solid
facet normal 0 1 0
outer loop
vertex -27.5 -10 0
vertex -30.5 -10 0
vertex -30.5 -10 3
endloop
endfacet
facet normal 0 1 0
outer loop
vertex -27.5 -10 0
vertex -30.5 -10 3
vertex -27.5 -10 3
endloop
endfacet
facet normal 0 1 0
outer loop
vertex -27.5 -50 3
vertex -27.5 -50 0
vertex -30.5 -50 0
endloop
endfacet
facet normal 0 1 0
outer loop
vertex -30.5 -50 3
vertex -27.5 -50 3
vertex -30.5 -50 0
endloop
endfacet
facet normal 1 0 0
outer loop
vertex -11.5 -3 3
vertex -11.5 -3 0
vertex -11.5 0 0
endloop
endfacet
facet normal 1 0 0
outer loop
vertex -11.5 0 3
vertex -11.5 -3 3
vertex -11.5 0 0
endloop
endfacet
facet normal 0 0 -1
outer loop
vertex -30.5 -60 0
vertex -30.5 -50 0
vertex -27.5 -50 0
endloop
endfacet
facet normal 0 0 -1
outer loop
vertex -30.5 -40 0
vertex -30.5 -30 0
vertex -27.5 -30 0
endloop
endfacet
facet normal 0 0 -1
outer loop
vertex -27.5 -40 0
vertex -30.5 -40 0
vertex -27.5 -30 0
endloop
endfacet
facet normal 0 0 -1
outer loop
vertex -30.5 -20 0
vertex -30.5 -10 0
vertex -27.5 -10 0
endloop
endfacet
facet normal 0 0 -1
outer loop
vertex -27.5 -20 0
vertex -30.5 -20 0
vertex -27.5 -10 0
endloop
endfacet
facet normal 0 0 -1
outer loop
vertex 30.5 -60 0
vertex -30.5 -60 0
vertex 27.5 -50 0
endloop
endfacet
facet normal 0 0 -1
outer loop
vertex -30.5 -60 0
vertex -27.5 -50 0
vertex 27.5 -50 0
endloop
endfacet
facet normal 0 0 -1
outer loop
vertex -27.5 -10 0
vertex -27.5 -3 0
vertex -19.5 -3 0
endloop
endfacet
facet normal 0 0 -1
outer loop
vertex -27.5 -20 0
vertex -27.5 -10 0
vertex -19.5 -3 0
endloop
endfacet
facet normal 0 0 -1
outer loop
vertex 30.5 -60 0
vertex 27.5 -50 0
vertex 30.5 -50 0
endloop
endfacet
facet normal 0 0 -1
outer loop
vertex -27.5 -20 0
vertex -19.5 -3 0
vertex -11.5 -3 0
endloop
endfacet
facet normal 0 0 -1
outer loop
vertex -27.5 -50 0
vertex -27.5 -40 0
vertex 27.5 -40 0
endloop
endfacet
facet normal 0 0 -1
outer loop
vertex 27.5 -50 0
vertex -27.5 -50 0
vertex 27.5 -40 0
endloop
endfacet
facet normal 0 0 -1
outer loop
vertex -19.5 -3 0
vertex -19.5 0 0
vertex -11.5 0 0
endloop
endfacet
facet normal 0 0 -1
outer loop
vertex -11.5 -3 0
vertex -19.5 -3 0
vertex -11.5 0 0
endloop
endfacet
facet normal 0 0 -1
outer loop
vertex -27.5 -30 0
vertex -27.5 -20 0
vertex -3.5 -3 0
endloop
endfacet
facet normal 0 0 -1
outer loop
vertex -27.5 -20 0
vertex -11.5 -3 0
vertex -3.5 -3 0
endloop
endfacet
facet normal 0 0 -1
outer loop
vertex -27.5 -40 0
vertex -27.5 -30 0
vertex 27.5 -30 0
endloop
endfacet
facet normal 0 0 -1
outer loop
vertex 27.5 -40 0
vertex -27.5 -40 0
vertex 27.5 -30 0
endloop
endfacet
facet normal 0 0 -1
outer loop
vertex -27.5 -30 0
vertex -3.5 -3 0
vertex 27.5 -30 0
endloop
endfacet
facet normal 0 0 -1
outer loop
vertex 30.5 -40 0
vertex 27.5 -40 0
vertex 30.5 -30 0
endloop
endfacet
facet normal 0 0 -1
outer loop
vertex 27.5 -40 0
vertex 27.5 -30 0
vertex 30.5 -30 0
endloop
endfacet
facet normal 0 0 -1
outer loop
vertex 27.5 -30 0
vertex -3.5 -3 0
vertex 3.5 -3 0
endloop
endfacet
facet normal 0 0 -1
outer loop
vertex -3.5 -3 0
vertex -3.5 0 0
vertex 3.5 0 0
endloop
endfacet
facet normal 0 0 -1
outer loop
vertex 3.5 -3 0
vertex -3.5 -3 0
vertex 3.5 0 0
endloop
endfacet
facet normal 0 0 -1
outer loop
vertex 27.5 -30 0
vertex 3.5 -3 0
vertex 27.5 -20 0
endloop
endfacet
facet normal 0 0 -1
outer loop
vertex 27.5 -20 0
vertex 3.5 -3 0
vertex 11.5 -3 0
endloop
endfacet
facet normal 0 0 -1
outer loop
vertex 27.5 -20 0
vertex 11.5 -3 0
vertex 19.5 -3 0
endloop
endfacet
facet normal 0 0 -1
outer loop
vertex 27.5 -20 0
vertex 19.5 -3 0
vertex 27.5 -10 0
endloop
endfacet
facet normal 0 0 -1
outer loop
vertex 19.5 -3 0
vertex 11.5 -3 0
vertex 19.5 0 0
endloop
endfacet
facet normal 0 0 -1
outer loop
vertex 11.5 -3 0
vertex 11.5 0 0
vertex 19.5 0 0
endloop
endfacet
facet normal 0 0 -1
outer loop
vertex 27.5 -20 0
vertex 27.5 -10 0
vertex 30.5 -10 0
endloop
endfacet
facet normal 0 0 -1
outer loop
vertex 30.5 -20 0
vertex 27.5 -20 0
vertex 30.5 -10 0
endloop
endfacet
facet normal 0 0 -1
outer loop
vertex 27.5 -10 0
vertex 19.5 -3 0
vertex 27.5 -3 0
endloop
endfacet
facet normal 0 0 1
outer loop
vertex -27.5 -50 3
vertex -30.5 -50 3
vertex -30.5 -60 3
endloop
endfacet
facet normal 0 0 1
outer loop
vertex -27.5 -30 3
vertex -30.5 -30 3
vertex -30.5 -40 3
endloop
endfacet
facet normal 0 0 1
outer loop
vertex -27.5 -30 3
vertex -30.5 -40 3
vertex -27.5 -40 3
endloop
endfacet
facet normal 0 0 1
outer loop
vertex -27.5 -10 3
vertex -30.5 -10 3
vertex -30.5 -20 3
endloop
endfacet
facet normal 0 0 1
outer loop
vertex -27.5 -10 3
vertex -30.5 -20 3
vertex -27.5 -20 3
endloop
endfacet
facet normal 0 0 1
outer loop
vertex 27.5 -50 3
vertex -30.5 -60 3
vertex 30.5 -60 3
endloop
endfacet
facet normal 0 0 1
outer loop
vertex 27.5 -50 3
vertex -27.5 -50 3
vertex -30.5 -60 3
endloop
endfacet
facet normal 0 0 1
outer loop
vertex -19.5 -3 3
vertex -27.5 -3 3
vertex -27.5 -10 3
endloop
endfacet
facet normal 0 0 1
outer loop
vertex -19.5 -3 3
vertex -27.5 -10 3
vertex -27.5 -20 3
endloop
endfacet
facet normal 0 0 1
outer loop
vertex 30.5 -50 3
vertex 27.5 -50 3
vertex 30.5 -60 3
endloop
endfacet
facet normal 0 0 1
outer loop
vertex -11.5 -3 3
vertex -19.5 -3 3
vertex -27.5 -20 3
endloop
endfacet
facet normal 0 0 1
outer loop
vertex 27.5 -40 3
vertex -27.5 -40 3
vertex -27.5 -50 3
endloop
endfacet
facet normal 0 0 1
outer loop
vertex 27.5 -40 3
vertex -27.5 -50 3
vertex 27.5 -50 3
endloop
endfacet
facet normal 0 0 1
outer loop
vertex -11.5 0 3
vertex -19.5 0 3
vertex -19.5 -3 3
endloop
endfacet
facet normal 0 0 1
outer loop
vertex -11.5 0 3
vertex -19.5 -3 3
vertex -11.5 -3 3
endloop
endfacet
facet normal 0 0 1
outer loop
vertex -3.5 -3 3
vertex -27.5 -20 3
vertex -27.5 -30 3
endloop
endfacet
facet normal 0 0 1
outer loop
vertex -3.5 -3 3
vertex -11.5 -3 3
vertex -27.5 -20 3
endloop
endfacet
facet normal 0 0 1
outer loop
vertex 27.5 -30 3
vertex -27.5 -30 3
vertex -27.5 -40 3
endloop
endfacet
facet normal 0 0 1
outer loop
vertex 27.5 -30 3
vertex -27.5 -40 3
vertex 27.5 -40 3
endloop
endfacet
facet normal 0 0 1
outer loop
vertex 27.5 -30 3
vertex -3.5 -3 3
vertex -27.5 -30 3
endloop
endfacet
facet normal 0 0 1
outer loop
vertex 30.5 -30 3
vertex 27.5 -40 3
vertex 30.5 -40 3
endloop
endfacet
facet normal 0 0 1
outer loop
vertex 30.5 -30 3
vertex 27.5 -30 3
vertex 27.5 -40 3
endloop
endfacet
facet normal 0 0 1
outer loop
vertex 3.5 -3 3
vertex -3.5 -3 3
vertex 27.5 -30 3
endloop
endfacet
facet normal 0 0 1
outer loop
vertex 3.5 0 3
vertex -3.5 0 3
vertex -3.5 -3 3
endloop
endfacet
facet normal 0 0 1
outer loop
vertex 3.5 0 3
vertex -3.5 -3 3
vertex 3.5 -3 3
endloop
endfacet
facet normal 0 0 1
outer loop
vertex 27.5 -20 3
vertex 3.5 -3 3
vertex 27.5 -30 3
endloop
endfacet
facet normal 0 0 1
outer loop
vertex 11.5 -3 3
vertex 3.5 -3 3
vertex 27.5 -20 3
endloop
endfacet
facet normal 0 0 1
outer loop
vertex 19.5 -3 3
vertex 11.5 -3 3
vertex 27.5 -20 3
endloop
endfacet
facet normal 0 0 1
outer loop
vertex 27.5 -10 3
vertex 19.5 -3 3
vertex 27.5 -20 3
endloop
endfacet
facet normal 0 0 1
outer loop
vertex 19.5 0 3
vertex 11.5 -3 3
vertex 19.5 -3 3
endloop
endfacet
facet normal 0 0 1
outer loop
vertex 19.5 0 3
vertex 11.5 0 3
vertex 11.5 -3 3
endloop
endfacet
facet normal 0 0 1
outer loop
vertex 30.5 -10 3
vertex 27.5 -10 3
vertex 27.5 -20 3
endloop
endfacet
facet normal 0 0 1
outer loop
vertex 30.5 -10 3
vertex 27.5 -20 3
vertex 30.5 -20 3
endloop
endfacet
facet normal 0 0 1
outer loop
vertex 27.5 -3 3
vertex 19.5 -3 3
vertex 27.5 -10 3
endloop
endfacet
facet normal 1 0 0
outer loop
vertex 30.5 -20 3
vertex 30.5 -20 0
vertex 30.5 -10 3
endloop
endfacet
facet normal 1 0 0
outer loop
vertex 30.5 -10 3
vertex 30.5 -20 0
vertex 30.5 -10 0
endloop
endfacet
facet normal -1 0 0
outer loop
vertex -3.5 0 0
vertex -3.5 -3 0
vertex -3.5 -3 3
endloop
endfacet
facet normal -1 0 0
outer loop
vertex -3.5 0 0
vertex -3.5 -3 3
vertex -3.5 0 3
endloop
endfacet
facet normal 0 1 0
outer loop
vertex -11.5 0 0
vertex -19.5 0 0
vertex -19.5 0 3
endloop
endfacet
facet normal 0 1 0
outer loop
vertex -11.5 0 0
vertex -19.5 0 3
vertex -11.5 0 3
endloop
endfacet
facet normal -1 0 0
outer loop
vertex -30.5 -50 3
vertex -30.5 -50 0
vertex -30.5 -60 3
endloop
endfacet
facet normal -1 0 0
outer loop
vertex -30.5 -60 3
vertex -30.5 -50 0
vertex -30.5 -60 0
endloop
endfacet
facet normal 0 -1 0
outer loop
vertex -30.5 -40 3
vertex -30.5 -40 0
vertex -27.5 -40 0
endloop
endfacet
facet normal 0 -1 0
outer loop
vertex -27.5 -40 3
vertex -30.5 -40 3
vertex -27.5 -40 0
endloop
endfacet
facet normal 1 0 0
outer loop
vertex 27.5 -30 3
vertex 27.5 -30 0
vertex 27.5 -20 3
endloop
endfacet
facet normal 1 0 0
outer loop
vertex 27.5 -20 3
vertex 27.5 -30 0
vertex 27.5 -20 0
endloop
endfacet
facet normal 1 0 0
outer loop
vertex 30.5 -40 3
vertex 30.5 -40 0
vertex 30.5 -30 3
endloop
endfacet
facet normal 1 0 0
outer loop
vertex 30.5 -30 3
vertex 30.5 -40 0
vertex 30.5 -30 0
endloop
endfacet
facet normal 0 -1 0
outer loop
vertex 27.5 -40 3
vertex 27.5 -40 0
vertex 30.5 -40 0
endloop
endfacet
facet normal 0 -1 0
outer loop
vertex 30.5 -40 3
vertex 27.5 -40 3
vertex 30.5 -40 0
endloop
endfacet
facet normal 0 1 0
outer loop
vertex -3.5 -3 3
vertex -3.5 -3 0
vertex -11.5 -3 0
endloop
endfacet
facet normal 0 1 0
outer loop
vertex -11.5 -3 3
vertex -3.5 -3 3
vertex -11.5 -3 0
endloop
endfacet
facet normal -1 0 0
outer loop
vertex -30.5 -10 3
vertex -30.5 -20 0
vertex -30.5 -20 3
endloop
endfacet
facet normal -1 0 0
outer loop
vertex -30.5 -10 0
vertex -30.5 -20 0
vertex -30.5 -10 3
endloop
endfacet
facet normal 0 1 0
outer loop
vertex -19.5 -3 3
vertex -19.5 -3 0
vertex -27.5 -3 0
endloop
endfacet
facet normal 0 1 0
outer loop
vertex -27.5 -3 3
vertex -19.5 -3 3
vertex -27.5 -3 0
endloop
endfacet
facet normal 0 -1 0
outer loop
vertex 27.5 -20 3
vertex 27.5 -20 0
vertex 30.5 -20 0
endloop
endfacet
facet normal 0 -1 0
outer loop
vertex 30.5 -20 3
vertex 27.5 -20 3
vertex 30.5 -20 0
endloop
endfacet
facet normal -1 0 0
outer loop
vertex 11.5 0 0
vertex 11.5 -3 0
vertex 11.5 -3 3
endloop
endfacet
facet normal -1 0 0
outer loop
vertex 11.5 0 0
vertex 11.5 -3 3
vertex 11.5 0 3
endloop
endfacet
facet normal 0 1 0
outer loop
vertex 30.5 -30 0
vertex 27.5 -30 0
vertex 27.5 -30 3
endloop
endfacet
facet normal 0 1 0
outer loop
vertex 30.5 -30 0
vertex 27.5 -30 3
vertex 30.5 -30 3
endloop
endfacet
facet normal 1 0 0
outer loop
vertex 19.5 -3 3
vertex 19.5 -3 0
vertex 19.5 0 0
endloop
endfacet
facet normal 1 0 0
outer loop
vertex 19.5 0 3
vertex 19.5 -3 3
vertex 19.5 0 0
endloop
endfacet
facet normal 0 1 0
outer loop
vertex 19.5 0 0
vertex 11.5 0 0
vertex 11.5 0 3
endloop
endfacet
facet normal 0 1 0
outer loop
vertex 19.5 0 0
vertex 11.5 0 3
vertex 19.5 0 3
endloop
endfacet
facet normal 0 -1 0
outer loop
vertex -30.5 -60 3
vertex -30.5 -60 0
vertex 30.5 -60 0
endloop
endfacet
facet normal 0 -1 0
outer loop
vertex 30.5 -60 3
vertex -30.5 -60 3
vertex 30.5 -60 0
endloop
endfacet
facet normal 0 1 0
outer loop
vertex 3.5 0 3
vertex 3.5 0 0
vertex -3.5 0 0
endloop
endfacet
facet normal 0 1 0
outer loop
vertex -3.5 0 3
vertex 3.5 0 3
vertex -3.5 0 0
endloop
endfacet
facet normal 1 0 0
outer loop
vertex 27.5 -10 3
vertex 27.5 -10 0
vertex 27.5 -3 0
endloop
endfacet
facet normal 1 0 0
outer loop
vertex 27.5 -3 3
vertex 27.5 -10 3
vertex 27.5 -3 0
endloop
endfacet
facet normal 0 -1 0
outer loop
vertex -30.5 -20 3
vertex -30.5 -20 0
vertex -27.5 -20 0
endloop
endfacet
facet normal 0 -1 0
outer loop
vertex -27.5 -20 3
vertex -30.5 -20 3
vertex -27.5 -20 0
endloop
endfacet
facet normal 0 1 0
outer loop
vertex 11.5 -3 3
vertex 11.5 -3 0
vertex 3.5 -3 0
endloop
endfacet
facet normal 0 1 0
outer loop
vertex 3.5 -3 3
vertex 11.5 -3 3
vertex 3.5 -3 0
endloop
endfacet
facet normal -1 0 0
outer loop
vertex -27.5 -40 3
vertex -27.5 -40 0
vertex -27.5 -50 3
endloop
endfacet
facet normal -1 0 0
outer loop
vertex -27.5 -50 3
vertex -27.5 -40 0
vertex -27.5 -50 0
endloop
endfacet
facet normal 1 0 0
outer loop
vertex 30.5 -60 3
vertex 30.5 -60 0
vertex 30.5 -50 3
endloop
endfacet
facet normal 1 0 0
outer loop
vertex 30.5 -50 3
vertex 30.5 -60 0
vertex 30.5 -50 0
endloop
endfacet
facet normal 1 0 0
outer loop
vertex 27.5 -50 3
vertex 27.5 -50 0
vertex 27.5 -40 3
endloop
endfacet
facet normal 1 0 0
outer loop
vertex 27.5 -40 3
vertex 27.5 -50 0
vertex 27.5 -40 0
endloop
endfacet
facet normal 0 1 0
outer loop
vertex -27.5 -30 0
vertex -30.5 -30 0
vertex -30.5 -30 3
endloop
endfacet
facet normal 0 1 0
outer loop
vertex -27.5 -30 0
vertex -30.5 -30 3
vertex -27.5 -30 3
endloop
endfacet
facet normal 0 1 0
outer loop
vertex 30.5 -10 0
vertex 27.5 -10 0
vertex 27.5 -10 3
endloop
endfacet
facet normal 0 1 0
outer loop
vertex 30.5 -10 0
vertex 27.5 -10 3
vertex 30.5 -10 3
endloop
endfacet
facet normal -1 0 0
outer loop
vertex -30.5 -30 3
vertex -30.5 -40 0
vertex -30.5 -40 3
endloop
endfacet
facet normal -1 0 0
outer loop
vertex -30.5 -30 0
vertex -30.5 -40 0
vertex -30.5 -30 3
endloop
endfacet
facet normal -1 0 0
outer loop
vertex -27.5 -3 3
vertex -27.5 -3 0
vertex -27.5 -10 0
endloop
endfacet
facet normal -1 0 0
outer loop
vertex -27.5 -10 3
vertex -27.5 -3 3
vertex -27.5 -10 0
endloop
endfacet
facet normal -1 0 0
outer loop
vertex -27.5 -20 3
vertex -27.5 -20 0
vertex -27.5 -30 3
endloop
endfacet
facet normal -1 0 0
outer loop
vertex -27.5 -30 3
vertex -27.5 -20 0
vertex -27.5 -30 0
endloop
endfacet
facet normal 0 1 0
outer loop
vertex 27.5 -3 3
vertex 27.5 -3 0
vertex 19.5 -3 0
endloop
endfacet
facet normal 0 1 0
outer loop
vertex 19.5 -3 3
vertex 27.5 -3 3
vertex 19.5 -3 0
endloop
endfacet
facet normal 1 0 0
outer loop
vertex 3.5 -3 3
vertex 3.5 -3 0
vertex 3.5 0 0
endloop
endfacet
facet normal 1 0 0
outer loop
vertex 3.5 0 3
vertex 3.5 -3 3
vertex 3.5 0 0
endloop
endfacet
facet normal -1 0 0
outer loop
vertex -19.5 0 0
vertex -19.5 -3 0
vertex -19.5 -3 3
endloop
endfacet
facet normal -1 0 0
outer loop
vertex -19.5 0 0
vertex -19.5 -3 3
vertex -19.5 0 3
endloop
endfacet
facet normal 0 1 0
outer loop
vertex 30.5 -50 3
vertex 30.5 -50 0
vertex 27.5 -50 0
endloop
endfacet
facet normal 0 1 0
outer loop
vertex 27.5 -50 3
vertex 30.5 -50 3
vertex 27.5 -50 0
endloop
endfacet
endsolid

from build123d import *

# Parameters (mm, degrees)
SKETCH1_W           = 3
SKETCH1_H           = 10
SKETCH1_W_2         = 27.5
SKETCH1_H_2         = 3
SKETCH1_W_3         = 8
SKETCH1_W_4         = 3.5
BOSS_EXTRUDE1_DEPTH = 3


with BuildPart() as part:
    # Sketch1 → Boss-Extrude1 (new body)
    with BuildSketch(Plane.XY):
        with Locations((-29, -15)):
            Rectangle(SKETCH1_W, SKETCH1_H)
        with Locations((-29, -35)):
            Rectangle(SKETCH1_W, SKETCH1_H)
        Polygon((-27.5, -60), (-27.5, -57), (-27.5, -50), (-30.5, -50), (-30.5, -60), align=None)
        Polygon((0, -57), (0, -3), (-3.5, -3), (-11.5, -3), (-19.5, -3), (-27.5, -3), (-27.5, -10), (-27.5, -20), (-27.5, -30), (-27.5, -40), (-27.5, -50), (-27.5, -57), align=None)
        Polygon((27.5, -10), (27.5, -3), (19.5, -3), (11.5, -3), (3.5, -3), (0, -3), (0, -57), (27.5, -57), (27.5, -50), (27.5, -40), (27.5, -30), (27.5, -20), align=None)
        with Locations((-13.75, -58.5)):
            Rectangle(SKETCH1_W_2, SKETCH1_H_2)
        with Locations((13.75, -58.5)):
            Rectangle(SKETCH1_W_2, SKETCH1_H_2)
        Polygon((30.5, -50), (27.5, -50), (27.5, -57), (27.5, -60), (30.5, -60), align=None)
        with Locations((29, -35)):
            Rectangle(SKETCH1_W, SKETCH1_H)
        with Locations((29, -15)):
            Rectangle(SKETCH1_W, SKETCH1_H)
        with Locations((15.5, -1.5)):
            Rectangle(SKETCH1_W_3, SKETCH1_H_2)
        with Locations((1.75, -1.5)):
            Rectangle(SKETCH1_W_4, SKETCH1_H_2)
        with Locations((-1.75, -1.5)):
            Rectangle(SKETCH1_W_4, SKETCH1_H_2)
        with Locations((-15.5, -1.5)):
            Rectangle(SKETCH1_W_3, SKETCH1_H_2)
    extrude(amount=BOSS_EXTRUDE1_DEPTH)


solid = part.part
